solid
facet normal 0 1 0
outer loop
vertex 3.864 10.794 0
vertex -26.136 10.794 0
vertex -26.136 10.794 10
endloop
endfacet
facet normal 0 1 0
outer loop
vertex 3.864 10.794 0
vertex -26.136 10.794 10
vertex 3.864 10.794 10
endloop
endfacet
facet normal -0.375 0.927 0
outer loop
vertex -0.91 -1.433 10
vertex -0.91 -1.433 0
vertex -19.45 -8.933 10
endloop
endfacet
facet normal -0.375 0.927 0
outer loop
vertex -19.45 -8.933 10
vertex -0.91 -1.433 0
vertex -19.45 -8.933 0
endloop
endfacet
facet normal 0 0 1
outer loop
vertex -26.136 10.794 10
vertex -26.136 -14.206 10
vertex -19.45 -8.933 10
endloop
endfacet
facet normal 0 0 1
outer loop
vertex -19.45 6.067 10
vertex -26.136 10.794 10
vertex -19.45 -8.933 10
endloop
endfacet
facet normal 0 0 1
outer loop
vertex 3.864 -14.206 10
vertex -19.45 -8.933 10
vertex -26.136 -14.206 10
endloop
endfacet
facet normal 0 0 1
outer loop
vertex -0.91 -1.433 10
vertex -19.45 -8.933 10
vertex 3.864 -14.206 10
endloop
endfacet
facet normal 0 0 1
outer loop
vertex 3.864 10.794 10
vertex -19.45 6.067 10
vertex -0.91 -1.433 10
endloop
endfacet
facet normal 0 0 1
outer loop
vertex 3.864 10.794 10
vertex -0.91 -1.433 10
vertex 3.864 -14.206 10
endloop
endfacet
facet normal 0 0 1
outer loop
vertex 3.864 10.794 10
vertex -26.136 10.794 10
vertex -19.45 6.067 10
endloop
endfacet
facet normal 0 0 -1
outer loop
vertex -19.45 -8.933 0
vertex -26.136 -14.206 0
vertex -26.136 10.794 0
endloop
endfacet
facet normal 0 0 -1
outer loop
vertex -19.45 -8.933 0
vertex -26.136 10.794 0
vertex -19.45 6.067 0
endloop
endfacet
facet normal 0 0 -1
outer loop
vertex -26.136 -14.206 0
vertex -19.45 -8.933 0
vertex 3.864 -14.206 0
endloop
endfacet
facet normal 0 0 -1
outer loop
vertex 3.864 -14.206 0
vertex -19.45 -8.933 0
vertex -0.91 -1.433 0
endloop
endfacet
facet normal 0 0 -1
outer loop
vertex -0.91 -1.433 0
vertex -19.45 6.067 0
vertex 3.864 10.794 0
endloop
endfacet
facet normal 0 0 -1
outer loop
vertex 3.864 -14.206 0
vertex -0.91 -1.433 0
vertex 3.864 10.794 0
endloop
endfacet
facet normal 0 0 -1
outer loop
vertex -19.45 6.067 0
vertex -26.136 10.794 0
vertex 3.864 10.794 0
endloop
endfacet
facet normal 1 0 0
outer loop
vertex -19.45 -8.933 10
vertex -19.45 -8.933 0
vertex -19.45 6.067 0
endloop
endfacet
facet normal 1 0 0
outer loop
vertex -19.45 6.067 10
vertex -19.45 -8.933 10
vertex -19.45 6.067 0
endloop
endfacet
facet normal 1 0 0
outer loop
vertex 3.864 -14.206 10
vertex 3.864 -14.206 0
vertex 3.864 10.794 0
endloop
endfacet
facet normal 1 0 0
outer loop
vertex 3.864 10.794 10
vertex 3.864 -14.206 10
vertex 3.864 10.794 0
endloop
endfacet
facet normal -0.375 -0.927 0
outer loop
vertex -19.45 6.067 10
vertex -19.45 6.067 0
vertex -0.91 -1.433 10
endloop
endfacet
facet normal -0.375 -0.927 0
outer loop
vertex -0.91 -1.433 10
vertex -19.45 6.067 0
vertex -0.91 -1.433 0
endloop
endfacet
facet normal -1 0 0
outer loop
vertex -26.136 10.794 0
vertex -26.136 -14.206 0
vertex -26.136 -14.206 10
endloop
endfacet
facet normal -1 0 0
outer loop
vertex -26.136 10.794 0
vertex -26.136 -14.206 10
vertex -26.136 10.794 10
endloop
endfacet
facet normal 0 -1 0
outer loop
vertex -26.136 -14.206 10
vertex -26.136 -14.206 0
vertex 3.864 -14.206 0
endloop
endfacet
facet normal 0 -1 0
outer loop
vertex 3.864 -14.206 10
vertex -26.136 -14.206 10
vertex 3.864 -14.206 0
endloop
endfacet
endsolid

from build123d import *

# Parameters (mm, degrees)
F0_W     = 30
F0_H     = 25
F1_DEPTH = 10


with BuildPart() as f1:
    # F0 (on Top) → F1 (new body)
    with BuildSketch(Plane.XY):
        with Locations((-11.136306, -1.705752)):
            Rectangle(F0_W, F0_H)
        Polygon((-19.450465, -8.932962), (-19.450465, 6.067038), (-0.909969, -1.432962), align=None, mode=Mode.SUBTRACT)
    extrude(amount=F1_DEPTH)


solid = f1.part
